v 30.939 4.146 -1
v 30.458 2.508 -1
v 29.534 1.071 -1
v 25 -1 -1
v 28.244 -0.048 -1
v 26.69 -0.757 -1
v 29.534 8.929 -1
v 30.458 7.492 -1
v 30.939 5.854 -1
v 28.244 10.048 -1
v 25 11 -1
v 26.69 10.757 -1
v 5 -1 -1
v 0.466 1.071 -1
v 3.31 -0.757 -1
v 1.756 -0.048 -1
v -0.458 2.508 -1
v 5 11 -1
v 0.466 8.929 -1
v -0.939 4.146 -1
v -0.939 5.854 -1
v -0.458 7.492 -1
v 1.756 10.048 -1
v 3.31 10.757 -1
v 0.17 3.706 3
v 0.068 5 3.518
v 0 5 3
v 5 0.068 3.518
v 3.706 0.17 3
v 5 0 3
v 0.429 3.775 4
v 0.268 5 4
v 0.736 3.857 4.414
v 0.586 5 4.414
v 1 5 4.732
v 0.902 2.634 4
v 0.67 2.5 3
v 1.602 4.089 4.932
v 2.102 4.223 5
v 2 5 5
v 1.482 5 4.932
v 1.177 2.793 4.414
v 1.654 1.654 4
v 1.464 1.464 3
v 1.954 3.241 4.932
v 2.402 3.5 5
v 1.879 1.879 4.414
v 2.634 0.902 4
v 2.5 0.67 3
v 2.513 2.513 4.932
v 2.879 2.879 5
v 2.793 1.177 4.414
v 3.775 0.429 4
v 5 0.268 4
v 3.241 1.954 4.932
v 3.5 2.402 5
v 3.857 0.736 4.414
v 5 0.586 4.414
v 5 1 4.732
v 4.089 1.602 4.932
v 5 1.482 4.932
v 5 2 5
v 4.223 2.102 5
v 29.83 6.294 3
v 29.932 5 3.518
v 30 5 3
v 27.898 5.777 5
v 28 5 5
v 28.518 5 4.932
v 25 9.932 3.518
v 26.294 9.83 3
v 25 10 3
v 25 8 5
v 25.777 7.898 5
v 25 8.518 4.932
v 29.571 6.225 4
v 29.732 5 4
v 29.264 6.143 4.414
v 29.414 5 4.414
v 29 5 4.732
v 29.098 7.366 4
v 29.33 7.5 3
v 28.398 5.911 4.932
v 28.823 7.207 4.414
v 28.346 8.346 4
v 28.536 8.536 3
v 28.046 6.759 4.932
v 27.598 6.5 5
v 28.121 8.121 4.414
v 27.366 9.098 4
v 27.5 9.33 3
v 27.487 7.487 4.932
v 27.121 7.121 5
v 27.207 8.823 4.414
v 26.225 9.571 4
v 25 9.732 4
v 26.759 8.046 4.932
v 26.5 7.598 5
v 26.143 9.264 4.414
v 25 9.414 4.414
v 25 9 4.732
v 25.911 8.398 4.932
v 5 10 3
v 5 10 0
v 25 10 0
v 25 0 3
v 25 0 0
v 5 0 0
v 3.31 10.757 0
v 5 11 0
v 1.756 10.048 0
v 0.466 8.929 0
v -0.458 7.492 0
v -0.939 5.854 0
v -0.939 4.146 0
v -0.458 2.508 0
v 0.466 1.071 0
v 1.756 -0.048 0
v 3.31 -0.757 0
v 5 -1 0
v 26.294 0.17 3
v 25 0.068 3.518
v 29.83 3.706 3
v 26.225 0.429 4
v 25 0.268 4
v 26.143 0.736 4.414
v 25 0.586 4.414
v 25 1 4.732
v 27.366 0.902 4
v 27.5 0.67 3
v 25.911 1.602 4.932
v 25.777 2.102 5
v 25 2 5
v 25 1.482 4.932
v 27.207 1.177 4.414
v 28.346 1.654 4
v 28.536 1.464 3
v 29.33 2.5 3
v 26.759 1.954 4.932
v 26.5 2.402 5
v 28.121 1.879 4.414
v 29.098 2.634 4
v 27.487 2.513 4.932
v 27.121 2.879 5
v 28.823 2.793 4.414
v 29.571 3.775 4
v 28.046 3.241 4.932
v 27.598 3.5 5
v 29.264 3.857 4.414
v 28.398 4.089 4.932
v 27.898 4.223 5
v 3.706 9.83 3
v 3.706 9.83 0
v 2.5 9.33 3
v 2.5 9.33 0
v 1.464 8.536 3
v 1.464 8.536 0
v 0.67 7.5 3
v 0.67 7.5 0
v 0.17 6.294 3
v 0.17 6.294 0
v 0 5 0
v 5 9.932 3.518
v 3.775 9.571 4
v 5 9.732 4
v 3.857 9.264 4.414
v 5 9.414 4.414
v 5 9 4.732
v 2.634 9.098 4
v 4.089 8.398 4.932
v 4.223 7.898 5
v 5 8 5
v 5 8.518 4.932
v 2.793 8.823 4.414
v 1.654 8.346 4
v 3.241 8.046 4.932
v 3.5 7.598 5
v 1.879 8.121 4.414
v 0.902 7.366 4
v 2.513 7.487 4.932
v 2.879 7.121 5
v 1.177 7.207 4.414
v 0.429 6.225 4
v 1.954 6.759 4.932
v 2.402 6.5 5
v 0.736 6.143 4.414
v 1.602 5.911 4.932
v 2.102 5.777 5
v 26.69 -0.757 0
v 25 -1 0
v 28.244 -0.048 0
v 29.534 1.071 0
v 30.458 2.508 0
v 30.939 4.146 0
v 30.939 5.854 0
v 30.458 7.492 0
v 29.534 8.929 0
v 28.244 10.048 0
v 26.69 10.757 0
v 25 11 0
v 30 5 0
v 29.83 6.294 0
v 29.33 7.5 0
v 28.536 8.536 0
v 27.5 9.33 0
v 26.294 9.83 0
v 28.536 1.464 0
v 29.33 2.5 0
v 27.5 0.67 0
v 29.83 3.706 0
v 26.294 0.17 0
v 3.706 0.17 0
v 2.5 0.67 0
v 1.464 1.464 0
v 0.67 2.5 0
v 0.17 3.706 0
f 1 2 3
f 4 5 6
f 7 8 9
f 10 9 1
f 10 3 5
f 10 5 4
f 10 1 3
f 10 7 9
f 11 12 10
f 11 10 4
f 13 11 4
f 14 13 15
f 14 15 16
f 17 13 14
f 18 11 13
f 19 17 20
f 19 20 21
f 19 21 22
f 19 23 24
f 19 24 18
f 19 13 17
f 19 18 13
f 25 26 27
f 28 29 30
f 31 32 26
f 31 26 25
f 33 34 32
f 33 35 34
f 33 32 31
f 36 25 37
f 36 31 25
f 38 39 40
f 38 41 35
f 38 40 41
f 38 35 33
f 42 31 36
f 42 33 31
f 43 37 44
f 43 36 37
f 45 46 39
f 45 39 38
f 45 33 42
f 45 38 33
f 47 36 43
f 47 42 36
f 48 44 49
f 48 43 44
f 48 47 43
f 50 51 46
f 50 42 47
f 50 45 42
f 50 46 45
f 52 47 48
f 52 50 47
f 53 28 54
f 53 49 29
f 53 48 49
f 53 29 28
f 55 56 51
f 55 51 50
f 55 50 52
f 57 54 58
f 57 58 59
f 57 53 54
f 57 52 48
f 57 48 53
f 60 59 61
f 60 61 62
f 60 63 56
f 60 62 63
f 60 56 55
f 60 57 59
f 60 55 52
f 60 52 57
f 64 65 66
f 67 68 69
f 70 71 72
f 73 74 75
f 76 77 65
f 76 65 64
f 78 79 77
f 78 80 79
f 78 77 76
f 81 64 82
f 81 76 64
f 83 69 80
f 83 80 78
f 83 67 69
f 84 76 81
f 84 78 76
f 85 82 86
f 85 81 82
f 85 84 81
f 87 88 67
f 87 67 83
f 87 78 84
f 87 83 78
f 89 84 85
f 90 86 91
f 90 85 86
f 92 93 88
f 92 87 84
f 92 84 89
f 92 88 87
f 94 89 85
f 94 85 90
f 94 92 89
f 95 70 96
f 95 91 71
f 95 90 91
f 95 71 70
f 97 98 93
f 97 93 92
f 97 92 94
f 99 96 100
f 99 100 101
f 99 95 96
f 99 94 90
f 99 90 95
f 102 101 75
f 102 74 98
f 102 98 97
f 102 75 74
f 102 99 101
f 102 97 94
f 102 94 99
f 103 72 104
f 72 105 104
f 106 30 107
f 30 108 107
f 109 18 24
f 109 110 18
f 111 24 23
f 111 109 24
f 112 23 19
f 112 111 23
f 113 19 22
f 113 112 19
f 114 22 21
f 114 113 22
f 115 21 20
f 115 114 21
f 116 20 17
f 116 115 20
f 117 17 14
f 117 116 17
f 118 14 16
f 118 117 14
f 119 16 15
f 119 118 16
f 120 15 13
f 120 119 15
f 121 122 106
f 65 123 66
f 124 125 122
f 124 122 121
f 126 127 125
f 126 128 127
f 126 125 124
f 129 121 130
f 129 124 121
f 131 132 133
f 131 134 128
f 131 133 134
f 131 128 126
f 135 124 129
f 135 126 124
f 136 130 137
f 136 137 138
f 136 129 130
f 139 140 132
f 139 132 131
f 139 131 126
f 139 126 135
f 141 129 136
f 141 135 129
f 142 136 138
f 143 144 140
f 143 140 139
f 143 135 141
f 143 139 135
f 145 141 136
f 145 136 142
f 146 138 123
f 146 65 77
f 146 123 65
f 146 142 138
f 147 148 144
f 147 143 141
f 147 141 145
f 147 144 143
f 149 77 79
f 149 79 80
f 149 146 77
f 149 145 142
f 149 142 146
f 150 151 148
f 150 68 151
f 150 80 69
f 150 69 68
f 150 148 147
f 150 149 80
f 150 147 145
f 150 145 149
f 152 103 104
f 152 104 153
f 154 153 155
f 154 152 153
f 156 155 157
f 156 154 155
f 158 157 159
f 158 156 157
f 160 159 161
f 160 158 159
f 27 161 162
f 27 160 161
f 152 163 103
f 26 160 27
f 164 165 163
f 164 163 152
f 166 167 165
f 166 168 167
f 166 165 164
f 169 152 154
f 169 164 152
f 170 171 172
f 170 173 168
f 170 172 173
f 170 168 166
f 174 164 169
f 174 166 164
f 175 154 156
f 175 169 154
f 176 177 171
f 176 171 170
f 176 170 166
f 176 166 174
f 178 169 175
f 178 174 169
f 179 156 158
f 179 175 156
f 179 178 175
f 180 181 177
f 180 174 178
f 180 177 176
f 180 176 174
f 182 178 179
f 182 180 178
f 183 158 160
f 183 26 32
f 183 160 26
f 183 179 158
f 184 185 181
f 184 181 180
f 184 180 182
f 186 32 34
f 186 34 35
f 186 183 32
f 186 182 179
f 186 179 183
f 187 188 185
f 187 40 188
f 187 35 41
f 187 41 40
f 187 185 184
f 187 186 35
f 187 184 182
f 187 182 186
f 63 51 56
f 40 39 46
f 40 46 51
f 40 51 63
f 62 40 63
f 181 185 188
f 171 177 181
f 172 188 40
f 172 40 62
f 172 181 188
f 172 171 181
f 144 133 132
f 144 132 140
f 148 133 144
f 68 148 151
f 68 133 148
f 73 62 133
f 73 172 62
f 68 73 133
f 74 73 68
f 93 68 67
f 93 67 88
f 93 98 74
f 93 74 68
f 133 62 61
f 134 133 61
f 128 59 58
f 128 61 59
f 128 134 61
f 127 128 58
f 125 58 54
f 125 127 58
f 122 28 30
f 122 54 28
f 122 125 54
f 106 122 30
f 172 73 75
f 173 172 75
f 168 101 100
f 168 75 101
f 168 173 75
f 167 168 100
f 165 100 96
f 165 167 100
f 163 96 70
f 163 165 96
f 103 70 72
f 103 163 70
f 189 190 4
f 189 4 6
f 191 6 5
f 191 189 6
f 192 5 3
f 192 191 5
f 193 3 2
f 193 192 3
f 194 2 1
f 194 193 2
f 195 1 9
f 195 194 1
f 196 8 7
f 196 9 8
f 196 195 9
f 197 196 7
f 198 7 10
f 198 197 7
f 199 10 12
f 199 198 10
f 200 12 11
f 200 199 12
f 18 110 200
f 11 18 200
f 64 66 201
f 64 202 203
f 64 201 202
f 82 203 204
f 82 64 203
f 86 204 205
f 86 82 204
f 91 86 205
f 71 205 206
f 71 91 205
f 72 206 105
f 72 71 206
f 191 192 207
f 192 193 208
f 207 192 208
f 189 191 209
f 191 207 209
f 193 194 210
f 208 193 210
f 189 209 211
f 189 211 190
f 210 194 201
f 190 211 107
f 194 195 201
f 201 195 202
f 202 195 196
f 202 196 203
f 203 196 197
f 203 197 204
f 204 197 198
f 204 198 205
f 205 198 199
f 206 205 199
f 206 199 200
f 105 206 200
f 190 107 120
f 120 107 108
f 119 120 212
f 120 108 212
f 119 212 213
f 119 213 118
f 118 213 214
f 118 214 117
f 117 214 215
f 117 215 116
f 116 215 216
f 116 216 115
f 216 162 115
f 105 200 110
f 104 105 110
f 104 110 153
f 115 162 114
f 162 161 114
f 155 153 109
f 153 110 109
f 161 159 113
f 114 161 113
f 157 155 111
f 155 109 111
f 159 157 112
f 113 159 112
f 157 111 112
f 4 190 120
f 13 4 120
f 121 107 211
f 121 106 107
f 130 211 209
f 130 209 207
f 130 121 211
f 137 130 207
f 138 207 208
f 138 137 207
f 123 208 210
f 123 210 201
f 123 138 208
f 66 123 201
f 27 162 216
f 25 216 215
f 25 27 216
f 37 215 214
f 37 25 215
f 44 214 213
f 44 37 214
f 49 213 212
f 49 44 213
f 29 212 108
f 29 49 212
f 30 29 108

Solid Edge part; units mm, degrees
sketch "Sketch1" plane through (0, 0, 0) normal (0, 0, 1) x (1, 0, 0)
  line L0 (30, 10) -> (0, 10)
  line L1 (0, 10) -> (0, 0)
  line L2 (0, 0) -> (30, 0)
  line L3 (30, 0) -> (30, 10)
extrude "Protrusion1" add sketch "Sketch1" along normal blind 5
fillet "Round_1" radius 5 4 edges at (30, 0, 2.5) (30, 10, 2.5) (0, 10, 2.5) (0, 0, 2.5)
fillet "Round_2" radius 2 3 edges at (15, 10, 5) (0, 5, 5) (15, 0, 5)
sketch "Sketch2" plane through (15, 5, 0) normal (0, 0, -1) x (1, 0, 0)
  line L0 (10, 6) -> (-10, 6)
  arc A0 (-10, 6) -> (-10, -6) centre (-10, 0) ccw
  line L1 (-10, -6) -> (10, -6)
  arc A1 (10, -6) -> (10, 6) centre (10, 0) ccw
extrude "ExtrudedProtrusion_2" add sketch "Sketch2" along normal blind 1
properties material "ABS Plastic, high impact"
